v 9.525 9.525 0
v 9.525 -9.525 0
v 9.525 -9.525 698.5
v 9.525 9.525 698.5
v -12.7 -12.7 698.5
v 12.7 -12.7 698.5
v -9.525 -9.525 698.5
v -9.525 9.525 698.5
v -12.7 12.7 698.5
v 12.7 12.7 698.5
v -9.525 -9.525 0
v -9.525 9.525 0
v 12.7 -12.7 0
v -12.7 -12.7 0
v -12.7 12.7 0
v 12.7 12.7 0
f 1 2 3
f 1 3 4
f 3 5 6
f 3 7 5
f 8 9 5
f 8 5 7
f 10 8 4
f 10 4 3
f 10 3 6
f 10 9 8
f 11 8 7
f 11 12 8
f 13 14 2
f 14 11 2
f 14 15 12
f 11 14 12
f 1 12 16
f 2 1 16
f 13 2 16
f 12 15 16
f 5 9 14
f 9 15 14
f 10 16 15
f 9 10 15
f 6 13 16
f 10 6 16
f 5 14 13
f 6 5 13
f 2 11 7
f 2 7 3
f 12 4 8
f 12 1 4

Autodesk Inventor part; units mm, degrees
ref_plane "YZ Plane" through (0, 0, 0) normal (1, 0, 0) x (0, 1, 0)
ref_plane "XZ Plane" through (0, 0, 0) normal (0, 1, 0) x (-1, 0, 0)
ref_plane "XY Plane" through (0, 0, 0) normal (0, 0, 1) x (1, 0, 0)
sketch "Sketch1" plane through (0, 0, 0) normal (0, 0, 1) x (1, 0, 0)
  line L0 (-12.7, 12.7) -> (-12.7, -12.7)
  line L1 (-12.7, -12.7) -> (12.7, -12.7)
  line L2 (12.7, -12.7) -> (12.7, 12.7)
  line L3 (12.7, 12.7) -> (-12.7, 12.7)
  line L4 (-9.525, 9.525) -> (-9.525, -9.525)
  line L5 (-9.525, -9.525) -> (9.525, -9.525)
  line L6 (9.525, -9.525) -> (9.525, 9.525)
  line L7 (9.525, 9.525) -> (-9.525, 9.525)
  point P0 (0, 0)
  dimension "d0" = 25.4
  dimension "d1" = 25.4
  dimension "d2" = 12.7
  dimension "d3" = 12.7
  dimension "d4" = 3.175
extrude "Extrusion1" add sketch "Sketch1" along normal blind 698.5
properties part number "27 in sq frame"
